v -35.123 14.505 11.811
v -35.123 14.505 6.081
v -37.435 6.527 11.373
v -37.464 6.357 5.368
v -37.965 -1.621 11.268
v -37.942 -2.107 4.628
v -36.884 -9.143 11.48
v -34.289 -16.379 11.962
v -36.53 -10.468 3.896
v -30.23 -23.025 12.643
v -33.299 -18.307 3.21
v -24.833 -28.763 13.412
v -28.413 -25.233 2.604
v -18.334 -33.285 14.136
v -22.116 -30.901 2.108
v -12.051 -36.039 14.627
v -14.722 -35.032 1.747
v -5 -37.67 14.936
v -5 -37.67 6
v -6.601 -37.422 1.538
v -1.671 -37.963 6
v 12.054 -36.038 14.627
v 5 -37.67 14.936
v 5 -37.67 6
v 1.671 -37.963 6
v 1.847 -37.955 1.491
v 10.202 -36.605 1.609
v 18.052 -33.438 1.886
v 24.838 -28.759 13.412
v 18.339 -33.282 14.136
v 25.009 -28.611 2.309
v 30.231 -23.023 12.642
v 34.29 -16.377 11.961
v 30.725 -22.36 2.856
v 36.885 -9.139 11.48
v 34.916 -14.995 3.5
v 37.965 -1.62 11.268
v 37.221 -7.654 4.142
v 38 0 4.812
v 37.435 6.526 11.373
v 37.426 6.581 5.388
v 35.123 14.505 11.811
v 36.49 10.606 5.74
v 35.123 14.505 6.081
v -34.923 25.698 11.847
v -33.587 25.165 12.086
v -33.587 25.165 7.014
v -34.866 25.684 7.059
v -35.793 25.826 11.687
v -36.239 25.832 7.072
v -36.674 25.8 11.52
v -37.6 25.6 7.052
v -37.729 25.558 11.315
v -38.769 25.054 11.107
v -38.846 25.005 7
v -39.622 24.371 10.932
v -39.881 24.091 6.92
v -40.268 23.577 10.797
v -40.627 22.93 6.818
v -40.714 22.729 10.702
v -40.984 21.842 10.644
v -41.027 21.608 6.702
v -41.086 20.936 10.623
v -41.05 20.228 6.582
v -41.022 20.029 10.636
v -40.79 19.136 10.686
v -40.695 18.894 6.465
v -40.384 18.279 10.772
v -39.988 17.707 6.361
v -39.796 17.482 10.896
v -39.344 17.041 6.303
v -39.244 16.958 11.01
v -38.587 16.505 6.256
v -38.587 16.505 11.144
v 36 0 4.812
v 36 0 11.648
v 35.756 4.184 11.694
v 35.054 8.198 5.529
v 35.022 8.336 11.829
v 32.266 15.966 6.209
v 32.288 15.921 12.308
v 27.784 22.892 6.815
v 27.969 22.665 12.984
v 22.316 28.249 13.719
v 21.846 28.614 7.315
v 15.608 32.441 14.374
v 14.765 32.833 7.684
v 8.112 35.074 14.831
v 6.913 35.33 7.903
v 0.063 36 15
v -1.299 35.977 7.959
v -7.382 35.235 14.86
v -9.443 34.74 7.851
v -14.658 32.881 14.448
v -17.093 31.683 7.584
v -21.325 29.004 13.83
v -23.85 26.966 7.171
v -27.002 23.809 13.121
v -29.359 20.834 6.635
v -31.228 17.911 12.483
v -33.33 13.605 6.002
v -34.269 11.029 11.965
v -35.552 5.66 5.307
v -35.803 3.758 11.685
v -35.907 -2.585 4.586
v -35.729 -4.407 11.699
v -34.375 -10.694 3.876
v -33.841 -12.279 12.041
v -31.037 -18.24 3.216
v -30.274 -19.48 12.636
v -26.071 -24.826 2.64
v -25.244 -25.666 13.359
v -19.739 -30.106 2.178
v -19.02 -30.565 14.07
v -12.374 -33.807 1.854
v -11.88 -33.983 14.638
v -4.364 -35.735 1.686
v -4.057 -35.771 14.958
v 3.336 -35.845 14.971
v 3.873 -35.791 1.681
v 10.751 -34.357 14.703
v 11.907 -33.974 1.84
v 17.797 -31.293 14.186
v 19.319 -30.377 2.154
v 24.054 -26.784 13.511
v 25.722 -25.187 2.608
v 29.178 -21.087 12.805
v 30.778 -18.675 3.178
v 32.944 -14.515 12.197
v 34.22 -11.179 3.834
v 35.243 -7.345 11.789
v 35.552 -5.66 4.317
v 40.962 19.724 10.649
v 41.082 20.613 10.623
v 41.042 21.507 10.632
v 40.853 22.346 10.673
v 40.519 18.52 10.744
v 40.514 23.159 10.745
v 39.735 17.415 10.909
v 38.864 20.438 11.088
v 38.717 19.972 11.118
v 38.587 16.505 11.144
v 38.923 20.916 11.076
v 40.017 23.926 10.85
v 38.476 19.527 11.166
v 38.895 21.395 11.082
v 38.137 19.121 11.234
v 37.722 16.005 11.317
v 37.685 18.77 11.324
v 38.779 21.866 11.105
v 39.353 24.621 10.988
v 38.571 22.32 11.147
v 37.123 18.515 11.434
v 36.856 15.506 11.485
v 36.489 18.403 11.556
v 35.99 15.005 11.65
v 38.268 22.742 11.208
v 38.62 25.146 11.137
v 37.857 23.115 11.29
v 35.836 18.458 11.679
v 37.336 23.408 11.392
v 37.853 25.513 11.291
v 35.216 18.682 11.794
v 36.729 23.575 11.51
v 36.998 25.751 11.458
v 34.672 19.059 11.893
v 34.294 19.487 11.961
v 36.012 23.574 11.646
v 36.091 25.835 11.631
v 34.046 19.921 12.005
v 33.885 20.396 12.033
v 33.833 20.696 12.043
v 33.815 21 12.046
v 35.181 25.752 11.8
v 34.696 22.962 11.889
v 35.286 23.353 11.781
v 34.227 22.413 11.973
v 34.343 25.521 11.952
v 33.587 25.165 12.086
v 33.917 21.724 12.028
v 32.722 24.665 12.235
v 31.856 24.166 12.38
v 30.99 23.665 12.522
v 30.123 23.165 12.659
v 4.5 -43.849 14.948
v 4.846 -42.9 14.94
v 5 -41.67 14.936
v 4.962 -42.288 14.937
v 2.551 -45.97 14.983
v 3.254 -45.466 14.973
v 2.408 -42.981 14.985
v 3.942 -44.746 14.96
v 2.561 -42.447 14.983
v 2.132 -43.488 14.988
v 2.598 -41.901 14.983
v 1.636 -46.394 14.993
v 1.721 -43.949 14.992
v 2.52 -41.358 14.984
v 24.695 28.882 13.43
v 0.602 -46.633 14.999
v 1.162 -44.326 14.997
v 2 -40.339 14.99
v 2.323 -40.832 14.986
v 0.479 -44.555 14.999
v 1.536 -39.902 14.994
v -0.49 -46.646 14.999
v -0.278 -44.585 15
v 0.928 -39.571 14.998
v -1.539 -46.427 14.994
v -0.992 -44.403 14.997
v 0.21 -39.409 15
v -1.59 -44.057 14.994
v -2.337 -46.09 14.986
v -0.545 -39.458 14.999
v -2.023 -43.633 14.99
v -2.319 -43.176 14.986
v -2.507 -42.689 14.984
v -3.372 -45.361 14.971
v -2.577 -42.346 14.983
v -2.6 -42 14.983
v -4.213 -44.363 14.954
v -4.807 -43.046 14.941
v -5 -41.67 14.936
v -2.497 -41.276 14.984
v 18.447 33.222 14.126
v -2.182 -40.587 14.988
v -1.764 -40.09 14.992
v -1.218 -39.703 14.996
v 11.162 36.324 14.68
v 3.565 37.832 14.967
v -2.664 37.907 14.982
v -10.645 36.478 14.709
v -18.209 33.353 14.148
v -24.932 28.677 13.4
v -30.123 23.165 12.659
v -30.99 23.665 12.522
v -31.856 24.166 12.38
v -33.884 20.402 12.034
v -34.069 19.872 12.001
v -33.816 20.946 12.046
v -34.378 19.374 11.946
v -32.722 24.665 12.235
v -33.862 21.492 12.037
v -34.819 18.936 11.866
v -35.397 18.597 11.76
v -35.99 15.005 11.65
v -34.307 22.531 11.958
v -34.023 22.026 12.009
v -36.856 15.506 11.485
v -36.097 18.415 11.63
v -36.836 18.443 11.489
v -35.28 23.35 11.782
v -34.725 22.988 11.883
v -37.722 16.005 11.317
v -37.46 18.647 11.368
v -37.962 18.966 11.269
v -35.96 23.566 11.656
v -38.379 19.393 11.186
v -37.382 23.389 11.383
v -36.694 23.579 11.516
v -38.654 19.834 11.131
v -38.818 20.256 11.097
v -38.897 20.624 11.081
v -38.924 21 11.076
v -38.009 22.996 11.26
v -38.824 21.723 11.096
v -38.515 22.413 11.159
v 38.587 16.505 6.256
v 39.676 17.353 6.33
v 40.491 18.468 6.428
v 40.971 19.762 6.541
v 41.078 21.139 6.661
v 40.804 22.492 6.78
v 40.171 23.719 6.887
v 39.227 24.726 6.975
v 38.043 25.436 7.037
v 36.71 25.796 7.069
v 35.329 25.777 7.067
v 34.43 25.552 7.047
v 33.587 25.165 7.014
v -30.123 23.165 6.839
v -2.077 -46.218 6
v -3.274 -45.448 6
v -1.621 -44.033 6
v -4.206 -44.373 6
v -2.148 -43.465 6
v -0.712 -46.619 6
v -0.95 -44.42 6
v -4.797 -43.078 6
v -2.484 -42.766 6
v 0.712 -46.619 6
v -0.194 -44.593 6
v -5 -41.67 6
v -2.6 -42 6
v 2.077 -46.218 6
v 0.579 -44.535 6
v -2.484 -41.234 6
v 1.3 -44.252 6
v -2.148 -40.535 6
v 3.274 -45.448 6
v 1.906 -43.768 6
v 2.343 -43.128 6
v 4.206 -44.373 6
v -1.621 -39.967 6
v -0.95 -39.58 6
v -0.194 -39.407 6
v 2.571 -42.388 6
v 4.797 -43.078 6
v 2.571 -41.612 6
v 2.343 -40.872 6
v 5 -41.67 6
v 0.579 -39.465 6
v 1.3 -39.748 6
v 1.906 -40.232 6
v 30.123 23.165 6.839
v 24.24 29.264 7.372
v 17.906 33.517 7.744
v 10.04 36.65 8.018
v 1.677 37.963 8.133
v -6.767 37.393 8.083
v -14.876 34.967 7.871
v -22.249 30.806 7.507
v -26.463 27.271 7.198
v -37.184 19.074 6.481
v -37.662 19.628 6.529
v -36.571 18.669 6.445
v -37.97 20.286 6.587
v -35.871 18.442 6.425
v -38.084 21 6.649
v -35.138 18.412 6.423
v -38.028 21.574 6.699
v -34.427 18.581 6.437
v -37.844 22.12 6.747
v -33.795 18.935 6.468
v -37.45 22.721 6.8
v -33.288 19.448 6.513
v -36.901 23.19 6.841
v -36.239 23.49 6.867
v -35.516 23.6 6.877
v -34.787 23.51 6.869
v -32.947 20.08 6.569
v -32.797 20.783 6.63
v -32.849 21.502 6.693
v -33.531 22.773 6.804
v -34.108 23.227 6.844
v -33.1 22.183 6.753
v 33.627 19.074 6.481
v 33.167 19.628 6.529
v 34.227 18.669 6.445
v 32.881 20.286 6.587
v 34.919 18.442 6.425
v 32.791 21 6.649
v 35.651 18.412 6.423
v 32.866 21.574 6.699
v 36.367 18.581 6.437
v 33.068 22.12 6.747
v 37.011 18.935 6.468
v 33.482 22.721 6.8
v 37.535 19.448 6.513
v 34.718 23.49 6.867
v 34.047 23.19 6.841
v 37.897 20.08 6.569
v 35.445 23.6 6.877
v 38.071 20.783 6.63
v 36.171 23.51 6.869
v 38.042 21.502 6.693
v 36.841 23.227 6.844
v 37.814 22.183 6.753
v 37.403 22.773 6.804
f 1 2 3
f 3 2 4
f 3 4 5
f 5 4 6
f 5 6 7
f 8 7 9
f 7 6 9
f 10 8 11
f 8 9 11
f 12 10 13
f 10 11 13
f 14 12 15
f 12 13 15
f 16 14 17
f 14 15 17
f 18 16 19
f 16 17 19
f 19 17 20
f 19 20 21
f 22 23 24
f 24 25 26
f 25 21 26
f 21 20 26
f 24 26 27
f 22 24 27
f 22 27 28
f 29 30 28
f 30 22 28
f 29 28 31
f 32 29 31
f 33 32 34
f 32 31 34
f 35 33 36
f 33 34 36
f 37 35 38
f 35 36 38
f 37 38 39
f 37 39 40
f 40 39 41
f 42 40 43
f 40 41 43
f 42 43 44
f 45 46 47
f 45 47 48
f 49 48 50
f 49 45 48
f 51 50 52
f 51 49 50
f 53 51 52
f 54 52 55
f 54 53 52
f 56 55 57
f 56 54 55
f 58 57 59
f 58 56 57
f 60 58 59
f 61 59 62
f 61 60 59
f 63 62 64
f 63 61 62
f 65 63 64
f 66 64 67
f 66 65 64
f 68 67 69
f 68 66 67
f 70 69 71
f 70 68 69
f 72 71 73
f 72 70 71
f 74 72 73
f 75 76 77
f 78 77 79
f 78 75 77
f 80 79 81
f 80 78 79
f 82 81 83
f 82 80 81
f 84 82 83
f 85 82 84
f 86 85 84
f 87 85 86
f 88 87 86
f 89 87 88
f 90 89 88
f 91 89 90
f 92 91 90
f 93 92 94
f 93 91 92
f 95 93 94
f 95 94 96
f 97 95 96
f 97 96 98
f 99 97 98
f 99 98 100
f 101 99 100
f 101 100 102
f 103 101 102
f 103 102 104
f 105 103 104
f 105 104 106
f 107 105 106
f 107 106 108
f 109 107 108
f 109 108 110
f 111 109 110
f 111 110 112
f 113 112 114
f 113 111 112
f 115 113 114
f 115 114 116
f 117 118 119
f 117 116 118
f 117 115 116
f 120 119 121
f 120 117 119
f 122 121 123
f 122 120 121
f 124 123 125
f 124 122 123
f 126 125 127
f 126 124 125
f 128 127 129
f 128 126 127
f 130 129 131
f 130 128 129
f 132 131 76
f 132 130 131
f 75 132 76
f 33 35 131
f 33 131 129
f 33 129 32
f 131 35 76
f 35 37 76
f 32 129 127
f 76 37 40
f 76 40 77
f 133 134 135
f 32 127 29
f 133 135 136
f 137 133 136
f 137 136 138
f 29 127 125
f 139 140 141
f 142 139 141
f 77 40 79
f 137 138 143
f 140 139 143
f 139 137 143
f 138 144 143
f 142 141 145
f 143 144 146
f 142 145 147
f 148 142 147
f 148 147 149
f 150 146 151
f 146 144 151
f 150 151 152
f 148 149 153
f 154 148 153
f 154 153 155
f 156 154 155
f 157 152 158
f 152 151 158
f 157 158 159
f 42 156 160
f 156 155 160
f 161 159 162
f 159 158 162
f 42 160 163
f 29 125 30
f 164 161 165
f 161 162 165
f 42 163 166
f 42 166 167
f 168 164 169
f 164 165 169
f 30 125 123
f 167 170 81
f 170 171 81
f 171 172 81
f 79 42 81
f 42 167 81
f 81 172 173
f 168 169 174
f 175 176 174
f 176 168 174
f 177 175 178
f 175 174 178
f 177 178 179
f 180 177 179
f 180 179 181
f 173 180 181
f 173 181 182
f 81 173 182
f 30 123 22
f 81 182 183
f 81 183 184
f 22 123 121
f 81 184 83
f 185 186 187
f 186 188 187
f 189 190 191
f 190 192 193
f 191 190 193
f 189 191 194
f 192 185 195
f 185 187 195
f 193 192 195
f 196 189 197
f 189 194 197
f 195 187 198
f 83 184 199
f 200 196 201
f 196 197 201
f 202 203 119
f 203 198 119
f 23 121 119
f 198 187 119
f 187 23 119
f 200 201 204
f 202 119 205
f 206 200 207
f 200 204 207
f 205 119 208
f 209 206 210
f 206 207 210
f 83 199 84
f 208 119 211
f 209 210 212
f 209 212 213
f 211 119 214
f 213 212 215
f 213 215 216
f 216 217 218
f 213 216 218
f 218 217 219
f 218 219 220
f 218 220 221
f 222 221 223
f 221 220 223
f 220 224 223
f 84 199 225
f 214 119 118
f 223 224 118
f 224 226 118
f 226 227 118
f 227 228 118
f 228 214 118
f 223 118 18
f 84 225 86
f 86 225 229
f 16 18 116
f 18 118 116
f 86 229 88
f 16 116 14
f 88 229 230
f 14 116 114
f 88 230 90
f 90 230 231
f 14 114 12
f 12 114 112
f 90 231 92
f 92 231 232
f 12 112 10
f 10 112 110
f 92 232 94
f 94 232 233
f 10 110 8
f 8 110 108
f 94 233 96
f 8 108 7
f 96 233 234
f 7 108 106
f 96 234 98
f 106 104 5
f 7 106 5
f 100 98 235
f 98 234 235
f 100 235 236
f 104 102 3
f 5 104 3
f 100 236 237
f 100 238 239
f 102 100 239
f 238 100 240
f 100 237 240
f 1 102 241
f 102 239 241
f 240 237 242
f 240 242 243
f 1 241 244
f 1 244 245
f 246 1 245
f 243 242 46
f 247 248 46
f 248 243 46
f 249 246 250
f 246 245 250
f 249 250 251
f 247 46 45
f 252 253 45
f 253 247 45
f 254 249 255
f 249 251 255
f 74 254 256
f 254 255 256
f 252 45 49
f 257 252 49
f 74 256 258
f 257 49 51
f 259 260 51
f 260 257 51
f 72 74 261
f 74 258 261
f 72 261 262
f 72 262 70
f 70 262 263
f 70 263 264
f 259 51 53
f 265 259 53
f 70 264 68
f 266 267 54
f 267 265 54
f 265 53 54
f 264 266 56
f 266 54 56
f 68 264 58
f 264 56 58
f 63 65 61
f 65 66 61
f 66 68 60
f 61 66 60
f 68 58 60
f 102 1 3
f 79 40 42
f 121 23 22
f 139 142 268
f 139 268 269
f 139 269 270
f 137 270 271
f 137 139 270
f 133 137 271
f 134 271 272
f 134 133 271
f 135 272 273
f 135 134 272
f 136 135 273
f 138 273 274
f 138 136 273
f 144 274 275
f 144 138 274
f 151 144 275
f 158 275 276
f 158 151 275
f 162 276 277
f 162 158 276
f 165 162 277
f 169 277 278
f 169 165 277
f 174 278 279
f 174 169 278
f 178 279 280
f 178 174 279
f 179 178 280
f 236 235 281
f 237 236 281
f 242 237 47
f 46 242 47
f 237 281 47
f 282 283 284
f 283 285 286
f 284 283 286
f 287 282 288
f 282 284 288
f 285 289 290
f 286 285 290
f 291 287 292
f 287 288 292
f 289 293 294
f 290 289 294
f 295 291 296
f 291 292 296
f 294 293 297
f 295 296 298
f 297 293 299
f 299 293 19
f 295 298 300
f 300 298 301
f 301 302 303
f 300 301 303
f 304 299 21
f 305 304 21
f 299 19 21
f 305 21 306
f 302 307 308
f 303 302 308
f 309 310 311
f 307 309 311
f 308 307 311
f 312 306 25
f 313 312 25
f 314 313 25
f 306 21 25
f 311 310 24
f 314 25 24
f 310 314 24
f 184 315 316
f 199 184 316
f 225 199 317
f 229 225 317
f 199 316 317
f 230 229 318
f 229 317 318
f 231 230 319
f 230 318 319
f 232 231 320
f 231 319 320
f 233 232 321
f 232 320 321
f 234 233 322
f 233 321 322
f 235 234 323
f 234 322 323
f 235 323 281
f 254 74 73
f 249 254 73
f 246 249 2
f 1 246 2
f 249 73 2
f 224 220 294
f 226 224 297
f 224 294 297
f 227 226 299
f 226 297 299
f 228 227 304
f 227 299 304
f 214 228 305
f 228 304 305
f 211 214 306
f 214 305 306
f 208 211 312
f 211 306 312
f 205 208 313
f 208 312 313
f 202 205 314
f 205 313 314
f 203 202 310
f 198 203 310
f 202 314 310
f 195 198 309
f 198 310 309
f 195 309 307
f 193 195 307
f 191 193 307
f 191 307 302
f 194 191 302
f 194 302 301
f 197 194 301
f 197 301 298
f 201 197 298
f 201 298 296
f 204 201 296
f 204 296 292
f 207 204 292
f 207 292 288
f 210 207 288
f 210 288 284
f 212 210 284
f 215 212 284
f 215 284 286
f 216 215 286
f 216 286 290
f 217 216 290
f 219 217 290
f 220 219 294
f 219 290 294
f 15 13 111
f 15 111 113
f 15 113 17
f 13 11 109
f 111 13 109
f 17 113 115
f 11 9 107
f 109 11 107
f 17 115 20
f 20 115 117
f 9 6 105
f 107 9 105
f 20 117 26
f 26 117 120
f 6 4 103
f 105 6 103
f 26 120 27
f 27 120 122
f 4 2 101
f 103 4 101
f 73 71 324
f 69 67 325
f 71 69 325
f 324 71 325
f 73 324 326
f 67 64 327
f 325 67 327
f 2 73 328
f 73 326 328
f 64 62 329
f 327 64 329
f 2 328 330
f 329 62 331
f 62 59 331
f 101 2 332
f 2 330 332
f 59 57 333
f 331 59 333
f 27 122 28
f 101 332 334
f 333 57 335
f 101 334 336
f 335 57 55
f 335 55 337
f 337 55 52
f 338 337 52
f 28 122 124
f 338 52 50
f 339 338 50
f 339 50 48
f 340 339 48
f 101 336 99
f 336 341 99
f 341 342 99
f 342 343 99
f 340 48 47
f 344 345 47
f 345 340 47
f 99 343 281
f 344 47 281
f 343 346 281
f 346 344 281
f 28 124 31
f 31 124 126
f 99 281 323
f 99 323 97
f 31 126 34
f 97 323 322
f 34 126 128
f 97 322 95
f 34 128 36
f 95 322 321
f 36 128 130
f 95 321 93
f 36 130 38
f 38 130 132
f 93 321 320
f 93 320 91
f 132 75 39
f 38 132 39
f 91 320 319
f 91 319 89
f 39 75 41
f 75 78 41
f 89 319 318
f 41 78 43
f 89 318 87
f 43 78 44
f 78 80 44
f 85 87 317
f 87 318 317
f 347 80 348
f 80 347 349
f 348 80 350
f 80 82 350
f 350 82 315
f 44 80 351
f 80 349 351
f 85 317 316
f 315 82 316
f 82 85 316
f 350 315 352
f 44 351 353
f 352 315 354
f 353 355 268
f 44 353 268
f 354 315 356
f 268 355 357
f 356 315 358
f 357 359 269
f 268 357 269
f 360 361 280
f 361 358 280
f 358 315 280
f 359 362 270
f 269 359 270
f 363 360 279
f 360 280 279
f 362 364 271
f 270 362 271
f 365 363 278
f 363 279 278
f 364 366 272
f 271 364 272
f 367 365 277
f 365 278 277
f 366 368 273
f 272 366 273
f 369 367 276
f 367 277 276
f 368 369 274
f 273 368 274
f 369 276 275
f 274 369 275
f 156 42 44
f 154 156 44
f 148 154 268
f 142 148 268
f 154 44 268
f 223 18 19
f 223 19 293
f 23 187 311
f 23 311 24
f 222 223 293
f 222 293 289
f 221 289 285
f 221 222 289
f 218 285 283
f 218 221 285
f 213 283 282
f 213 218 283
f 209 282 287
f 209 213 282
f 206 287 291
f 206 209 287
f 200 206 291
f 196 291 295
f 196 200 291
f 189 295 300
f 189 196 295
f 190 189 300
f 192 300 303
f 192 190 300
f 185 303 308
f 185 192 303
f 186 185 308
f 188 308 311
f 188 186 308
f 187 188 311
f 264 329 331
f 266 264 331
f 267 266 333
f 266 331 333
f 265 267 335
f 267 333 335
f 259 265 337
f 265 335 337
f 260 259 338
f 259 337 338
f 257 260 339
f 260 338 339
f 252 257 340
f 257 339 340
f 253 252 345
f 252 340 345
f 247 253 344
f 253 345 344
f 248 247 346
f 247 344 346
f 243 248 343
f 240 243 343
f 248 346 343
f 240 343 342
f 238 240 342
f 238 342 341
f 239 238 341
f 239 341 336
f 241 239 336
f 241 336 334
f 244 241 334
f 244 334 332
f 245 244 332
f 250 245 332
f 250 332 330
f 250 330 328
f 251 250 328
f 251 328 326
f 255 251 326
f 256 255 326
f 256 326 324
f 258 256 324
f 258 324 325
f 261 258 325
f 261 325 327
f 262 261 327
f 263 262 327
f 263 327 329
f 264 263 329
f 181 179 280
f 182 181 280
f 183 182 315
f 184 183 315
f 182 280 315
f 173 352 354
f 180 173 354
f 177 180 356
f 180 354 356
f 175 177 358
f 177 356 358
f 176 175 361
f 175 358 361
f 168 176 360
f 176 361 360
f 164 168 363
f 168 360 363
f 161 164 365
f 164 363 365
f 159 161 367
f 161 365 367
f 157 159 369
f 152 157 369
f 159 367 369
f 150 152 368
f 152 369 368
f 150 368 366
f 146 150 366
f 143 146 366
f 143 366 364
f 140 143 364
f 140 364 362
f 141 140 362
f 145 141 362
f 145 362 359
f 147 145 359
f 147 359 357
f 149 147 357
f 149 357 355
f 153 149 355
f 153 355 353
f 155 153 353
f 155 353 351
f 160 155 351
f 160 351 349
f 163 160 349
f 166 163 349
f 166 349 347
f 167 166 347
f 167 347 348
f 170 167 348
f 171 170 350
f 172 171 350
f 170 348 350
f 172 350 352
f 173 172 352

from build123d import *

# Parameters (mm, degrees)
SKETCH_1_R                              = 38
SKETCH_1_R_2                            = 36
EXTRUDE_310_DEPTH                       = 15
EXTRUDE_START                           = -9
EXTRUDE_4_DEPTH                         = 9
FILLET_3_RADIUS                         = 5
FILLET_3_LENGTH                         = 9
PATTERN_CIRCULAR_4_COUNT                = 3
FILLET_3_OF_PATTERN_CIRCULAR_4_2_RADIUS = 5
FILLET_3_OF_PATTERN_CIRCULAR_4_2_LENGTH = 9
FILLET_3_OF_PATTERN_CIRCULAR_4_3_RADIUS = 5
FILLET_3_OF_PATTERN_CIRCULAR_4_3_LENGTH = 9
SKETCH_6_W                              = 176.950469939
SKETCH_6_H                              = 123.439451547
CUT_REVOLVE_861_ANGLE                   = 5
SKETCH_14_W                             = 84.084463922
SKETCH_14_H                             = 246.249240822
MM_7_D                                  = 5.2
MM_7_ON_FACE_2_D                        = 5.2
MM_7_ON_FACE_3_D                        = 5.2


with BuildPart() as part:
    # 草图1 → Extrude 310 (new body)
    with BuildSketch(Plane.XY):
        Circle(SKETCH_1_R)
        Circle(SKETCH_1_R_2, mode=Mode.SUBTRACT)
    extrude(amount=EXTRUDE_310_DEPTH)

    # 草图11 → 凸台-拉伸4 (add)
    with BuildSketch(Plane.XY.offset(15).offset(EXTRUDE_START)):
        with BuildLine():
            Line((-5, -37.669616404), (-5, -46.669616404))
            Line((-5, -46.669616404), (5, -46.669616404))
            Line((5, -46.669616404), (5, -37.669616404))
            ThreePointArc((5, -37.669616404), (0, -38), (-5, -37.669616404))
        make_face()
    extrude_4 = extrude(amount=EXTRUDE_4_DEPTH)

    # 圆角3: full round fillet: the end face becomes a half cylinder, R = half its width
    fillet_3_face = Plane((0, -46.669616404, 10.5), x_dir=(0, 0, 1), z_dir=(0, -1, 0))  # on the end face: x along it, z out of the body
    fillet_3_slab = fillet_3_face.offset(-FILLET_3_RADIUS / 2) * Box(FILLET_3_LENGTH, 2 * FILLET_3_RADIUS, FILLET_3_RADIUS, mode=Mode.PRIVATE)  # the body's end, R deep
    fillet_3_round = Plane((0, -41.669616404, 10.5), x_dir=(0, -1, 0), z_dir=(0, 0, 1)) * Cylinder(FILLET_3_RADIUS, FILLET_3_LENGTH, mode=Mode.PRIVATE)  # its axis R under the face
    add(fillet_3_slab - fillet_3_round, mode=Mode.SUBTRACT)

    # 阵列(圆周)4: 凸台-拉伸4 ×3 about axis
    pattern_circular_4_axis = Axis((0, 0, 0), (0, 0, 1))
    for i in range(1, PATTERN_CIRCULAR_4_COUNT):
        add(extrude_4.rotate(pattern_circular_4_axis, i * 360 / PATTERN_CIRCULAR_4_COUNT))

    # 圆角3 of Pattern Circular 4 2: full round fillet: the end face becomes a half cylinder, R = half its width
    fillet_3_of_pattern_circular_4_2_face = Plane((40.417073391, 23.334808202, 10.5), x_dir=(0, 0, 1), z_dir=(0.866025403784, 0.5, 0))  # on the end face: x along it, z out of the body
    fillet_3_of_pattern_circular_4_2_slab = fillet_3_of_pattern_circular_4_2_face.offset(-FILLET_3_OF_PATTERN_CIRCULAR_4_2_RADIUS / 2) * Box(FILLET_3_OF_PATTERN_CIRCULAR_4_2_LENGTH, 2 * FILLET_3_OF_PATTERN_CIRCULAR_4_2_RADIUS, FILLET_3_OF_PATTERN_CIRCULAR_4_2_RADIUS, mode=Mode.PRIVATE)  # the body's end, R deep
    fillet_3_of_pattern_circular_4_2_round = Plane((36.086946372, 20.834808202, 10.5), x_dir=(0.866025403784, 0.5, 0), z_dir=(0, 0, 1)) * Cylinder(FILLET_3_OF_PATTERN_CIRCULAR_4_2_RADIUS, FILLET_3_OF_PATTERN_CIRCULAR_4_2_LENGTH, mode=Mode.PRIVATE)  # its axis R under the face
    add(fillet_3_of_pattern_circular_4_2_slab - fillet_3_of_pattern_circular_4_2_round, mode=Mode.SUBTRACT)

    # 圆角3 of Pattern Circular 4 3: full round fillet: the end face becomes a half cylinder, R = half its width
    fillet_3_of_pattern_circular_4_3_face = Plane((-40.417073391, 23.334808202, 10.5), x_dir=(0, 0, 1), z_dir=(-0.866025403784, 0.5, 0))  # on the end face: x along it, z out of the body
    fillet_3_of_pattern_circular_4_3_slab = fillet_3_of_pattern_circular_4_3_face.offset(-FILLET_3_OF_PATTERN_CIRCULAR_4_3_RADIUS / 2) * Box(FILLET_3_OF_PATTERN_CIRCULAR_4_3_LENGTH, 2 * FILLET_3_OF_PATTERN_CIRCULAR_4_3_RADIUS, FILLET_3_OF_PATTERN_CIRCULAR_4_3_RADIUS, mode=Mode.PRIVATE)  # the body's end, R deep
    fillet_3_of_pattern_circular_4_3_round = Plane((-36.086946372, 20.834808202, 10.5), x_dir=(-0.866025403784, 0.5, 0), z_dir=(0, 0, 1)) * Cylinder(FILLET_3_OF_PATTERN_CIRCULAR_4_3_RADIUS, FILLET_3_OF_PATTERN_CIRCULAR_4_3_LENGTH, mode=Mode.PRIVATE)  # its axis R under the face
    add(fillet_3_of_pattern_circular_4_3_slab - fillet_3_of_pattern_circular_4_3_round, mode=Mode.SUBTRACT)

    # 草图6 → Cut-Revolve 861 (revolve, cut)
    with BuildSketch(Plane.XY):
        with Locations((-6.549725274, 19.685381772)):
            Rectangle(SKETCH_6_W, SKETCH_6_H)
    revolve(axis=Axis((41.8, -55, 0), (1, 0, 0)), revolution_arc=CUT_REVOLVE_861_ANGLE, mode=Mode.SUBTRACT)

    # 草图14 → Cut-Revolve 1016 (revolve, cut)
    with BuildSketch(Plane(origin=(0, 0, 0), x_dir=(0, 0, -1), z_dir=(1, 0, 0))):
        with Locations((-57.042231961, 14.211955097)):
            Rectangle(SKETCH_14_W, SKETCH_14_H)
    revolve(axis=Axis((0, 42.23348082, -180), (0, -1, 0)), mode=Mode.SUBTRACT)

    # 大小mm 暗销孔7 (through all)
    with Locations(Plane(origin=(-36.373066959, 21, 11.577660493), x_dir=(0.98244954099, 0, 0.186528548507), z_dir=(-0.186528548507, 0, 0.98244954099))):
        with Locations((0, 0)):
            Hole(MM_7_D / 2)

    # 大小mm 暗销孔7 on face 2 (through all)
    with Locations(Plane(origin=(0, -42, 15), x_dir=(1, 0, 0), z_dir=(0, 0, 1))):
        with Locations((0, 0)):
            Hole(MM_7_ON_FACE_2_D / 2)

    # 大小mm 暗销孔7 on face 3 (through all)
    with Locations(Plane(origin=(36.373066959, 21, 11.577660493), x_dir=(0.982449474222, 0, -0.186528900175), z_dir=(0.186528900175, 0, 0.982449474222))):
        with Locations((0, 0)):
            Hole(MM_7_ON_FACE_3_D / 2)


solid = part.part
